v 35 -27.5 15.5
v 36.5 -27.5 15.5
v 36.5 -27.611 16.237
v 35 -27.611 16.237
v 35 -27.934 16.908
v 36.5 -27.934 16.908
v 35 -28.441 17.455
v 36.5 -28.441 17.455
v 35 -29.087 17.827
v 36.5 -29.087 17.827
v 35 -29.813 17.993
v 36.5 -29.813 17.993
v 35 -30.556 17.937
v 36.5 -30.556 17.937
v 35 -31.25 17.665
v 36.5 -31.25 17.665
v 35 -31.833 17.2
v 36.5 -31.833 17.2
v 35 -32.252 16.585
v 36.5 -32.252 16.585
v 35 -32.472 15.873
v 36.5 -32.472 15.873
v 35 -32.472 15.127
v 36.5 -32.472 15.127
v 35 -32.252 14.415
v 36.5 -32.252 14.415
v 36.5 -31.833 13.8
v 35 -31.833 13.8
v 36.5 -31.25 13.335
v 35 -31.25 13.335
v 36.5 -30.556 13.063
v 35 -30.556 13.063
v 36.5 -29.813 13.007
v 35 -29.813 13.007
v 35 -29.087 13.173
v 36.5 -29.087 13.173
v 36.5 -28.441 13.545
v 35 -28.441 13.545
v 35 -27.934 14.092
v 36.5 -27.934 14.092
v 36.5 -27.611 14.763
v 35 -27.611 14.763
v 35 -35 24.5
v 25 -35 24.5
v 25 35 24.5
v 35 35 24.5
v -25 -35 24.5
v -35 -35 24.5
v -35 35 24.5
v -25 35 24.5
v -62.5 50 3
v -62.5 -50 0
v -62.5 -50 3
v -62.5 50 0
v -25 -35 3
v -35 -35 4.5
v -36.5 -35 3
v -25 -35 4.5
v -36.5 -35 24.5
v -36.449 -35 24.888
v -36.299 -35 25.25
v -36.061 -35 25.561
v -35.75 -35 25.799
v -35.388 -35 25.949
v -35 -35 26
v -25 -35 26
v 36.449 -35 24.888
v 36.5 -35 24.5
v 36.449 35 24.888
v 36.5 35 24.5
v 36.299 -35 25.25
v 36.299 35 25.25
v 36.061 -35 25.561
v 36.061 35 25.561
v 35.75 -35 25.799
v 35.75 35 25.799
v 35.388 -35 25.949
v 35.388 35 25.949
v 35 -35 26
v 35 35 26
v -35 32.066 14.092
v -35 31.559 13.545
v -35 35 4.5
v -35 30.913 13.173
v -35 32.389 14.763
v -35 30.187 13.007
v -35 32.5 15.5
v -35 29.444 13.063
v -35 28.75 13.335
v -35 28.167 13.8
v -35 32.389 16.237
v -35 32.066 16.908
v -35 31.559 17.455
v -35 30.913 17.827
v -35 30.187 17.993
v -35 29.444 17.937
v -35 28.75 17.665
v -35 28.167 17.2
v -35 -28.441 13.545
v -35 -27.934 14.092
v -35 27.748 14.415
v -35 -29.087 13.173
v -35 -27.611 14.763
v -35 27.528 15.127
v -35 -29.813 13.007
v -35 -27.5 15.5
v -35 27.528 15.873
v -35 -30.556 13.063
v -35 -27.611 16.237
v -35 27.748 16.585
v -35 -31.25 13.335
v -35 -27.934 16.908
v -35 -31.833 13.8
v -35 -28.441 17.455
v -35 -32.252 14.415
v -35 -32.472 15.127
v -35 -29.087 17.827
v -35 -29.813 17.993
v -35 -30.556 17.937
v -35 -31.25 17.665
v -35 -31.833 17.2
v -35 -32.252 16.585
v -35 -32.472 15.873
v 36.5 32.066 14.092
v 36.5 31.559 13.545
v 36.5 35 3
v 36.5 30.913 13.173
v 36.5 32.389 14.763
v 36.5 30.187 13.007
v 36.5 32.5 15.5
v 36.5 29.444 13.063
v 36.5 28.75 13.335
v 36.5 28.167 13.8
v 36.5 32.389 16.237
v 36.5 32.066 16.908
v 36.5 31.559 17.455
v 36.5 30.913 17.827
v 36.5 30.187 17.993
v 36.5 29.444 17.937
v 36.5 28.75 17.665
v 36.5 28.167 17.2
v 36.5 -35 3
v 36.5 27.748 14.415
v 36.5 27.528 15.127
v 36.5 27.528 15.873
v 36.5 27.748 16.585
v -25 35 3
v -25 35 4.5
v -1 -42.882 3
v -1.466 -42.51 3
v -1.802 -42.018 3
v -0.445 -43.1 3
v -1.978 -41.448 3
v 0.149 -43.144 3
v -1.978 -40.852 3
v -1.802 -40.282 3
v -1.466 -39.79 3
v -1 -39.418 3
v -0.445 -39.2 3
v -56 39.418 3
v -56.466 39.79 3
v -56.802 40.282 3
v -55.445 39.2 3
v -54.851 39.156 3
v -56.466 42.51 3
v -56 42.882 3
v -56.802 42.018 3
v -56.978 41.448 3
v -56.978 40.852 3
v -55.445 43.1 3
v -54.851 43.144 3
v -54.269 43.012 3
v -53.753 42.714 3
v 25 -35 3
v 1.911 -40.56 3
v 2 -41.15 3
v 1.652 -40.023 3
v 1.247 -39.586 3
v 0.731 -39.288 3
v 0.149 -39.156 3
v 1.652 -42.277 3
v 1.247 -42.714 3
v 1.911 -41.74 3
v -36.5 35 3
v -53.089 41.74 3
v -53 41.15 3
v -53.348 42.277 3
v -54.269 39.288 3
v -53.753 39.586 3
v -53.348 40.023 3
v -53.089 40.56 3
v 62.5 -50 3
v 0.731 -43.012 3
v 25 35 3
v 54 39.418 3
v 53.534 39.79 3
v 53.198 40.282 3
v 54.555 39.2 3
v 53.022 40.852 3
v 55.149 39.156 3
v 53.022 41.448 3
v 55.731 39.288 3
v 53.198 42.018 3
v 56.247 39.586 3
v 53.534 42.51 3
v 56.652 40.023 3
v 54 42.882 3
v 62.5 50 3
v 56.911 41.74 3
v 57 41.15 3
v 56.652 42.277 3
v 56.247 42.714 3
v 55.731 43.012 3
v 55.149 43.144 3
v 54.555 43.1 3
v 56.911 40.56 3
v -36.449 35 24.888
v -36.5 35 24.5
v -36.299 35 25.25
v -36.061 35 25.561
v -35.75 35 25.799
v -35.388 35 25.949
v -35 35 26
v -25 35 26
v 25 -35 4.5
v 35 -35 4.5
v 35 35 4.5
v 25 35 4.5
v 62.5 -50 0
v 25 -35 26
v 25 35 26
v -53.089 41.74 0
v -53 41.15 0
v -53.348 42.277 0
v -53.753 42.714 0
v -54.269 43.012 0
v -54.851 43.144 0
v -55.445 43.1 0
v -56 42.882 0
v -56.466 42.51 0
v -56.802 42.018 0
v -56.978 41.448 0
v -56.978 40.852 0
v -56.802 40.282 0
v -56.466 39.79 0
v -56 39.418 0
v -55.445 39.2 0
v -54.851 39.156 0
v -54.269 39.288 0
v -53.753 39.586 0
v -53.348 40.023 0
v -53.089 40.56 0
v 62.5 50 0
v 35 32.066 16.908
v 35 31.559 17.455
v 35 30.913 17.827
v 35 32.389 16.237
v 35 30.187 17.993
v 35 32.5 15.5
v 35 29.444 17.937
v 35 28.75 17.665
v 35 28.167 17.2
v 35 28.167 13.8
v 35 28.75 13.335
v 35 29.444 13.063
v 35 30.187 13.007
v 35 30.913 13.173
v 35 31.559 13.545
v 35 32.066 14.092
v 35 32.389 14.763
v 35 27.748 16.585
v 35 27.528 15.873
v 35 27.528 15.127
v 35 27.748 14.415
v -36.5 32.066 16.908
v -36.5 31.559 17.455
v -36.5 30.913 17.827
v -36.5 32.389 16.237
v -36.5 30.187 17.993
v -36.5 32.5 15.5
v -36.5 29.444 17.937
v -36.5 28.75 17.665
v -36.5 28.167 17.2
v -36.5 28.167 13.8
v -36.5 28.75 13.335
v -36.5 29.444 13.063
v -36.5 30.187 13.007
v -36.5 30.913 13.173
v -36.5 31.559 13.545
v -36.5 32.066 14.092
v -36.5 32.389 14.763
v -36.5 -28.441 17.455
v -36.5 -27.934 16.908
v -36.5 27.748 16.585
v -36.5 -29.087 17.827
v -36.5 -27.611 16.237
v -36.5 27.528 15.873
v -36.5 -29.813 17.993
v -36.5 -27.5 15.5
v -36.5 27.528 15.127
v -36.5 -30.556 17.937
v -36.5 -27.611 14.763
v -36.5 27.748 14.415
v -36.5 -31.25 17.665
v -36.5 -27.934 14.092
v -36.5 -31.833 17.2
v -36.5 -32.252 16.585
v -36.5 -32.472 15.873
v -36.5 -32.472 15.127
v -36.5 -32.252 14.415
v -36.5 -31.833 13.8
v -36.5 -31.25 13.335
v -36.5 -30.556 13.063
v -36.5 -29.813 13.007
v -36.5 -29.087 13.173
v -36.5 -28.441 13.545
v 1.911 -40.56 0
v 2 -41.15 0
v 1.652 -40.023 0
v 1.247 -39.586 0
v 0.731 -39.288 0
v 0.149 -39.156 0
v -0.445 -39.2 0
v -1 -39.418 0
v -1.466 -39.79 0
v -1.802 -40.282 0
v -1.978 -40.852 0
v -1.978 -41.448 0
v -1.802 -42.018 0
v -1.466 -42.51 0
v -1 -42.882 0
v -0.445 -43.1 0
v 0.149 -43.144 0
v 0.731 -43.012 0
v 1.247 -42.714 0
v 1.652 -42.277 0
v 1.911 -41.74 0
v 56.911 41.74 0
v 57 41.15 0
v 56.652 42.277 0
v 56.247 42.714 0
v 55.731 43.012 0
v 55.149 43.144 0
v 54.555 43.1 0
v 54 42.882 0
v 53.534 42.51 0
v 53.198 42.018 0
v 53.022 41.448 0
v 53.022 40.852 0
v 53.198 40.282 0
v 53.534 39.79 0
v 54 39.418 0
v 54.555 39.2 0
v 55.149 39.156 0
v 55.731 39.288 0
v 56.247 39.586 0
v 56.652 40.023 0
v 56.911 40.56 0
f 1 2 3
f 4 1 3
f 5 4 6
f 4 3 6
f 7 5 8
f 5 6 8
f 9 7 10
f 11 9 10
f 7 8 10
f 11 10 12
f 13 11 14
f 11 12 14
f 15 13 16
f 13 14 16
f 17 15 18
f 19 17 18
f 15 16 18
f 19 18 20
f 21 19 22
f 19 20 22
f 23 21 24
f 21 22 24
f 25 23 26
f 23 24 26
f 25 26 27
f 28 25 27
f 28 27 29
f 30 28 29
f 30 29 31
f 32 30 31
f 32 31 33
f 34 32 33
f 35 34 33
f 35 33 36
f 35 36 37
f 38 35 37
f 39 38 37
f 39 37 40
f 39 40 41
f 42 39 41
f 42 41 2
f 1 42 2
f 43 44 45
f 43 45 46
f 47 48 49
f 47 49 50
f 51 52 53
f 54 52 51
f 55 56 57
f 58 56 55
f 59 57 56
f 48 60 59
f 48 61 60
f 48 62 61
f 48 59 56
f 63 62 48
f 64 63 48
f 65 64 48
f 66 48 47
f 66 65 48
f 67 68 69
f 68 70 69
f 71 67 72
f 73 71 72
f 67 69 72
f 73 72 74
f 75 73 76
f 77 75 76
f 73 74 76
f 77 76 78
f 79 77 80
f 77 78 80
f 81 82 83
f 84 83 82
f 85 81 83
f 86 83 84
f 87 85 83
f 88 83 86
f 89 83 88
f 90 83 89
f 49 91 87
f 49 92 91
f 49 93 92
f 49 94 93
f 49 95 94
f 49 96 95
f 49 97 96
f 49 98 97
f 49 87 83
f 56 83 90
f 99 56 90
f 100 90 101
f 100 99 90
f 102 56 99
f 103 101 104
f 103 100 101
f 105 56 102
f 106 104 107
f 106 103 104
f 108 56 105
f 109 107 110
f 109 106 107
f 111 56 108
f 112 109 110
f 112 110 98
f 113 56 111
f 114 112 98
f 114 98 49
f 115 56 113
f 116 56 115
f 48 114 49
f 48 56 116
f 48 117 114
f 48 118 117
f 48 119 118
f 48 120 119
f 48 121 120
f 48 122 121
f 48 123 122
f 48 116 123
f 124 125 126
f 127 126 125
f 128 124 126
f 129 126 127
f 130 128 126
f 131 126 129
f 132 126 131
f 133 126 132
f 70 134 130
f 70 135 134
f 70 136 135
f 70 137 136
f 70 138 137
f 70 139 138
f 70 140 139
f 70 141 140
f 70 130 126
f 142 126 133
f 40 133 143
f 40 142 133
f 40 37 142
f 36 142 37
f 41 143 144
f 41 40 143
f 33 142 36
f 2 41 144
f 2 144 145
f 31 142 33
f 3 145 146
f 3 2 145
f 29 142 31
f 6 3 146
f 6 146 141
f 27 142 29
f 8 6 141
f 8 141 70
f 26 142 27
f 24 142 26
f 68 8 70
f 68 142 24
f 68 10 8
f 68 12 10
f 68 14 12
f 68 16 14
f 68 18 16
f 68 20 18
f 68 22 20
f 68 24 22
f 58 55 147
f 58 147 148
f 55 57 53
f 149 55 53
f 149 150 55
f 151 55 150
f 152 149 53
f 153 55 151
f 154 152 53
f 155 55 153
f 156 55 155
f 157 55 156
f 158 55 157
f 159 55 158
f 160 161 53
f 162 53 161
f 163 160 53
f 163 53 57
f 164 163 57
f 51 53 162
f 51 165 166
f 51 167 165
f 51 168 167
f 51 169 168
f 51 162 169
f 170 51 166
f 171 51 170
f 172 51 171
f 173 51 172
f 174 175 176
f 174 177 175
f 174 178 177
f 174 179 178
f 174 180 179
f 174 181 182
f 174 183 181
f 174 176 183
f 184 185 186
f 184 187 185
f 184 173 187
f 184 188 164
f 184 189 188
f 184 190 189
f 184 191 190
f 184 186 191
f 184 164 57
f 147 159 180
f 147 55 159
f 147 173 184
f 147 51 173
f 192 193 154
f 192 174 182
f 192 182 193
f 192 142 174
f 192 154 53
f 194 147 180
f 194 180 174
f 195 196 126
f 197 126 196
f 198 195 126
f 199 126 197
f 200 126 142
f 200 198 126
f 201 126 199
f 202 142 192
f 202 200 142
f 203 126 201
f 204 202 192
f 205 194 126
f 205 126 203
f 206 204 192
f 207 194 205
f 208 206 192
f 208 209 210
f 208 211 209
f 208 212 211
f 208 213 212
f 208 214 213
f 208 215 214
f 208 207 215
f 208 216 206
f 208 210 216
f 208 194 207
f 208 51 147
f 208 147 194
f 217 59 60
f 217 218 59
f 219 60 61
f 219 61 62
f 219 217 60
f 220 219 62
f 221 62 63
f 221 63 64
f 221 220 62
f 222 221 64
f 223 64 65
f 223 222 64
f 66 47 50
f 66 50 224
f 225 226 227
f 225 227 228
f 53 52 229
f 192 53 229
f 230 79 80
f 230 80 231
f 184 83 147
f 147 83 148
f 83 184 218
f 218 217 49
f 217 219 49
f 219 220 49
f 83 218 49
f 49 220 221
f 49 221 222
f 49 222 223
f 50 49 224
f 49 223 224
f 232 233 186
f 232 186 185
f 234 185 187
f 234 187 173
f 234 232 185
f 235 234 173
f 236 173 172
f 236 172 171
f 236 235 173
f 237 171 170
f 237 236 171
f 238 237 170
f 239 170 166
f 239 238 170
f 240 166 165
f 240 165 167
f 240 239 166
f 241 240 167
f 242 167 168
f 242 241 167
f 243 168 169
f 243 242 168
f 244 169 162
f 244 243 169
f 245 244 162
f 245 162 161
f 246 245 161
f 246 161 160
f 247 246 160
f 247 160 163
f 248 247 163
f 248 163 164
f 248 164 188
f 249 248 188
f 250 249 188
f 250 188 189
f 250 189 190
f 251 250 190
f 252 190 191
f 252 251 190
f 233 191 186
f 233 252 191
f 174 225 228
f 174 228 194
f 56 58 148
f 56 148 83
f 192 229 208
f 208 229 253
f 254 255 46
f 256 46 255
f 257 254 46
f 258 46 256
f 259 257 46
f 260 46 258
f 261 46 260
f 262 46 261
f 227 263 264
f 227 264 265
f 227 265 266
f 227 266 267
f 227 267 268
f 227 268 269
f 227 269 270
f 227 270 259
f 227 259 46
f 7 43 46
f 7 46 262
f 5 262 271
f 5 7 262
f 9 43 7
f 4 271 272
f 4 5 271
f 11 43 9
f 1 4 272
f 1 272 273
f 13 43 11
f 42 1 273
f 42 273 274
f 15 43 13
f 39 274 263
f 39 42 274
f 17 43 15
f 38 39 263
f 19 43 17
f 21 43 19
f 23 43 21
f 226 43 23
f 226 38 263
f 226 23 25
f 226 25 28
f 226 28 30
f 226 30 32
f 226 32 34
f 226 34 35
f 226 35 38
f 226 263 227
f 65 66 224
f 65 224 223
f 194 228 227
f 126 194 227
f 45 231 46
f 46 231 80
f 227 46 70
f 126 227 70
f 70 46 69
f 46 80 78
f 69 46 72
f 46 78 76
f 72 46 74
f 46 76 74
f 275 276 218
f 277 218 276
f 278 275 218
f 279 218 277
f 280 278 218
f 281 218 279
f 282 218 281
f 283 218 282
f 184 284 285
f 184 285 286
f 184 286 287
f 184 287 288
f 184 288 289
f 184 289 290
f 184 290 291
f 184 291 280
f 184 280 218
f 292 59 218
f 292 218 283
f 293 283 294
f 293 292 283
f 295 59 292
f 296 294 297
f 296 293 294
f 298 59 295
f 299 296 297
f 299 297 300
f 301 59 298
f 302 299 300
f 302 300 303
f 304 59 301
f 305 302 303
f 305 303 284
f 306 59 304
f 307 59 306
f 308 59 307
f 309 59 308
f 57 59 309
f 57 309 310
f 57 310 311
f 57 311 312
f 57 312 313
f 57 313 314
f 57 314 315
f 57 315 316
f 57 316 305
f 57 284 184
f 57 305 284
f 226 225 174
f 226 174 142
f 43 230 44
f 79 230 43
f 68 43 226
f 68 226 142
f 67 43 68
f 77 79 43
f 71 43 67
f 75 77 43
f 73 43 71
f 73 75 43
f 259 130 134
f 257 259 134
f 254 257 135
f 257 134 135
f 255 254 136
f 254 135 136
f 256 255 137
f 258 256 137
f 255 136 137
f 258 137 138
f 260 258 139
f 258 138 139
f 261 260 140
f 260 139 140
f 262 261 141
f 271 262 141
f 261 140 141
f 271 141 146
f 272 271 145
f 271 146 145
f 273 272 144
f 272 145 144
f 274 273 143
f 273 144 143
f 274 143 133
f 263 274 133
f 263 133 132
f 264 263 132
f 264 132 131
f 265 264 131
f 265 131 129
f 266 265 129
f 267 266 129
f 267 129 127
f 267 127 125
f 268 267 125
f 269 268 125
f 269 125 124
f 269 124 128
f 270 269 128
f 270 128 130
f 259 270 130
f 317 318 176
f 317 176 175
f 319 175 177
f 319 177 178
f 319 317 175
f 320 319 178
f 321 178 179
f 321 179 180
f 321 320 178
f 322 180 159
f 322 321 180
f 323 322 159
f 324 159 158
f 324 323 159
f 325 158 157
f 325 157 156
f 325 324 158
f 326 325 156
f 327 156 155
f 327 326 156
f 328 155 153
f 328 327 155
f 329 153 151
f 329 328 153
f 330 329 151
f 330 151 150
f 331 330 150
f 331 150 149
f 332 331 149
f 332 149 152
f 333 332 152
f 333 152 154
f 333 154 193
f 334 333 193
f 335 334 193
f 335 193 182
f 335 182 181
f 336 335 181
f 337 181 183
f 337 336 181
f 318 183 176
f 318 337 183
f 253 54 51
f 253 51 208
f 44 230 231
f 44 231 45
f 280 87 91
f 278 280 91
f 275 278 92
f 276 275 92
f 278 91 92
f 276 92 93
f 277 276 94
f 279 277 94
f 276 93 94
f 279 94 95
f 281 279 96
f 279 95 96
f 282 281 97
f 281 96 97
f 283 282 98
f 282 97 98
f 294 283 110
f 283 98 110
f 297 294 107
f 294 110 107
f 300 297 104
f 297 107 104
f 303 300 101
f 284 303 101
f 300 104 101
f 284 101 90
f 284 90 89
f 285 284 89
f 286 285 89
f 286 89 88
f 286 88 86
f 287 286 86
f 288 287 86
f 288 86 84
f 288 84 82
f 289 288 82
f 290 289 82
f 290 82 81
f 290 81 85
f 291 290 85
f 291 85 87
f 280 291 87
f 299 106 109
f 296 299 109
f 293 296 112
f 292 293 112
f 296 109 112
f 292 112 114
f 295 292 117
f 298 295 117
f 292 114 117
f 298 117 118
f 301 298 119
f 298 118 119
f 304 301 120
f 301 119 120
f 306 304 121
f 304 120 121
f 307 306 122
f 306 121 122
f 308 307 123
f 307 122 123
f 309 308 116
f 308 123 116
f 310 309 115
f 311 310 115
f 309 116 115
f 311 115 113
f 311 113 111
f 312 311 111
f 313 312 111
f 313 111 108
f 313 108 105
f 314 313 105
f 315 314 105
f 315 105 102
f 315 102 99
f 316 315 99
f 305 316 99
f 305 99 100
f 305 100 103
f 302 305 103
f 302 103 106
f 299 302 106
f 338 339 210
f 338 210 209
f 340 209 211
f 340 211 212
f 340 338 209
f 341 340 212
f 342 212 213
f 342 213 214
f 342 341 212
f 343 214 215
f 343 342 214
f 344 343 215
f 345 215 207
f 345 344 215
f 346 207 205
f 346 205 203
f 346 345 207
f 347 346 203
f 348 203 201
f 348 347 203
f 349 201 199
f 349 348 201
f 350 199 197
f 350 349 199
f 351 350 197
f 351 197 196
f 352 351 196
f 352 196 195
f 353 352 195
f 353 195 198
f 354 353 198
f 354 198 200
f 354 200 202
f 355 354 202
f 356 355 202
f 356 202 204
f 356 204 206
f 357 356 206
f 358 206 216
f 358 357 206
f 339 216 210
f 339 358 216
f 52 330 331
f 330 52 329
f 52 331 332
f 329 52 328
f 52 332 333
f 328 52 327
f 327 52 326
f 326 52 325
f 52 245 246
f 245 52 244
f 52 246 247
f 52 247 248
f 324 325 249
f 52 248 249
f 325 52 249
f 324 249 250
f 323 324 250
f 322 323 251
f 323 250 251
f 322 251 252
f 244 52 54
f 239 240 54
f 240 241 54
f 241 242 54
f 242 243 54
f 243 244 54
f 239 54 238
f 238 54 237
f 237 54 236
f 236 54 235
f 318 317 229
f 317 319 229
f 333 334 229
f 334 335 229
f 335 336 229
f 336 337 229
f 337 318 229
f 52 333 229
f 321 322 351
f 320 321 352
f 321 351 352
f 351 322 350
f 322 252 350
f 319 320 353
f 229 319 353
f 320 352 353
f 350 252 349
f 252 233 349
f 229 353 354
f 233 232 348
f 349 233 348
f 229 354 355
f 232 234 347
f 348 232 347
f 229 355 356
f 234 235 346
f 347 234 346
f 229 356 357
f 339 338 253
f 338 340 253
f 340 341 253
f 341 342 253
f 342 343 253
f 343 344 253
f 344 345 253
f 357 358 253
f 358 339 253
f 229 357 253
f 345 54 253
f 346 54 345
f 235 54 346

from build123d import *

# Parameters (mm, degrees)
F0_W     = 125
F0_H     = 100
F0_R     = 2
F1_DEPTH = 3
F4_DEPTH = 70
F5_R     = 2.5
F6_DEPTH = 99.001
F7_R     = 1.5


with BuildPart() as f1:
    # F0 (on Top) → F1 (new body)
    with BuildSketch(Plane.XY):
        Rectangle(F0_W, F0_H)
        with Locations((0, -41.15)):
            Circle(F0_R, mode=Mode.SUBTRACT)
        with Locations((-55, 41.15)):
            Circle(F0_R, mode=Mode.SUBTRACT)
        with Locations((55, 41.15)):
            Circle(F0_R, mode=Mode.SUBTRACT)
    extrude(amount=F1_DEPTH)

    # F3 (on offset) → F4 (join)
    with BuildSketch(Plane.XZ.offset(35)):
        Polygon((35, 24.5), (35, 4.5), (25, 4.5), (25, 3), (36.5, 3), (36.5, 26), (25, 26), (25, 24.5), align=None)
        Polygon((-36.5, 26), (-36.5, 3), (-25, 3), (-25, 4.5), (-35, 4.5), (-35, 24.5), (-25, 24.5), (-25, 26), align=None)
    extrude(amount=-F4_DEPTH)

    # F5 (on face) → F6 (cut, through all)
    with BuildSketch(Plane.YZ.offset(36.5)):
        with Locations((-30, 15.5)):
            Circle(F5_R)
        with Locations((30, 15.5)):
            Circle(F5_R)
    extrude(amount=-F6_DEPTH, mode=Mode.SUBTRACT)

    # F7
    f7_edges = [f1.edges().sort_by_distance(p)[0] for p in [
        (36.5, 0, 26),
        (-36.5, 0, 26),
    ]]
    fillet(f7_edges, radius=F7_R)


solid = f1.part
